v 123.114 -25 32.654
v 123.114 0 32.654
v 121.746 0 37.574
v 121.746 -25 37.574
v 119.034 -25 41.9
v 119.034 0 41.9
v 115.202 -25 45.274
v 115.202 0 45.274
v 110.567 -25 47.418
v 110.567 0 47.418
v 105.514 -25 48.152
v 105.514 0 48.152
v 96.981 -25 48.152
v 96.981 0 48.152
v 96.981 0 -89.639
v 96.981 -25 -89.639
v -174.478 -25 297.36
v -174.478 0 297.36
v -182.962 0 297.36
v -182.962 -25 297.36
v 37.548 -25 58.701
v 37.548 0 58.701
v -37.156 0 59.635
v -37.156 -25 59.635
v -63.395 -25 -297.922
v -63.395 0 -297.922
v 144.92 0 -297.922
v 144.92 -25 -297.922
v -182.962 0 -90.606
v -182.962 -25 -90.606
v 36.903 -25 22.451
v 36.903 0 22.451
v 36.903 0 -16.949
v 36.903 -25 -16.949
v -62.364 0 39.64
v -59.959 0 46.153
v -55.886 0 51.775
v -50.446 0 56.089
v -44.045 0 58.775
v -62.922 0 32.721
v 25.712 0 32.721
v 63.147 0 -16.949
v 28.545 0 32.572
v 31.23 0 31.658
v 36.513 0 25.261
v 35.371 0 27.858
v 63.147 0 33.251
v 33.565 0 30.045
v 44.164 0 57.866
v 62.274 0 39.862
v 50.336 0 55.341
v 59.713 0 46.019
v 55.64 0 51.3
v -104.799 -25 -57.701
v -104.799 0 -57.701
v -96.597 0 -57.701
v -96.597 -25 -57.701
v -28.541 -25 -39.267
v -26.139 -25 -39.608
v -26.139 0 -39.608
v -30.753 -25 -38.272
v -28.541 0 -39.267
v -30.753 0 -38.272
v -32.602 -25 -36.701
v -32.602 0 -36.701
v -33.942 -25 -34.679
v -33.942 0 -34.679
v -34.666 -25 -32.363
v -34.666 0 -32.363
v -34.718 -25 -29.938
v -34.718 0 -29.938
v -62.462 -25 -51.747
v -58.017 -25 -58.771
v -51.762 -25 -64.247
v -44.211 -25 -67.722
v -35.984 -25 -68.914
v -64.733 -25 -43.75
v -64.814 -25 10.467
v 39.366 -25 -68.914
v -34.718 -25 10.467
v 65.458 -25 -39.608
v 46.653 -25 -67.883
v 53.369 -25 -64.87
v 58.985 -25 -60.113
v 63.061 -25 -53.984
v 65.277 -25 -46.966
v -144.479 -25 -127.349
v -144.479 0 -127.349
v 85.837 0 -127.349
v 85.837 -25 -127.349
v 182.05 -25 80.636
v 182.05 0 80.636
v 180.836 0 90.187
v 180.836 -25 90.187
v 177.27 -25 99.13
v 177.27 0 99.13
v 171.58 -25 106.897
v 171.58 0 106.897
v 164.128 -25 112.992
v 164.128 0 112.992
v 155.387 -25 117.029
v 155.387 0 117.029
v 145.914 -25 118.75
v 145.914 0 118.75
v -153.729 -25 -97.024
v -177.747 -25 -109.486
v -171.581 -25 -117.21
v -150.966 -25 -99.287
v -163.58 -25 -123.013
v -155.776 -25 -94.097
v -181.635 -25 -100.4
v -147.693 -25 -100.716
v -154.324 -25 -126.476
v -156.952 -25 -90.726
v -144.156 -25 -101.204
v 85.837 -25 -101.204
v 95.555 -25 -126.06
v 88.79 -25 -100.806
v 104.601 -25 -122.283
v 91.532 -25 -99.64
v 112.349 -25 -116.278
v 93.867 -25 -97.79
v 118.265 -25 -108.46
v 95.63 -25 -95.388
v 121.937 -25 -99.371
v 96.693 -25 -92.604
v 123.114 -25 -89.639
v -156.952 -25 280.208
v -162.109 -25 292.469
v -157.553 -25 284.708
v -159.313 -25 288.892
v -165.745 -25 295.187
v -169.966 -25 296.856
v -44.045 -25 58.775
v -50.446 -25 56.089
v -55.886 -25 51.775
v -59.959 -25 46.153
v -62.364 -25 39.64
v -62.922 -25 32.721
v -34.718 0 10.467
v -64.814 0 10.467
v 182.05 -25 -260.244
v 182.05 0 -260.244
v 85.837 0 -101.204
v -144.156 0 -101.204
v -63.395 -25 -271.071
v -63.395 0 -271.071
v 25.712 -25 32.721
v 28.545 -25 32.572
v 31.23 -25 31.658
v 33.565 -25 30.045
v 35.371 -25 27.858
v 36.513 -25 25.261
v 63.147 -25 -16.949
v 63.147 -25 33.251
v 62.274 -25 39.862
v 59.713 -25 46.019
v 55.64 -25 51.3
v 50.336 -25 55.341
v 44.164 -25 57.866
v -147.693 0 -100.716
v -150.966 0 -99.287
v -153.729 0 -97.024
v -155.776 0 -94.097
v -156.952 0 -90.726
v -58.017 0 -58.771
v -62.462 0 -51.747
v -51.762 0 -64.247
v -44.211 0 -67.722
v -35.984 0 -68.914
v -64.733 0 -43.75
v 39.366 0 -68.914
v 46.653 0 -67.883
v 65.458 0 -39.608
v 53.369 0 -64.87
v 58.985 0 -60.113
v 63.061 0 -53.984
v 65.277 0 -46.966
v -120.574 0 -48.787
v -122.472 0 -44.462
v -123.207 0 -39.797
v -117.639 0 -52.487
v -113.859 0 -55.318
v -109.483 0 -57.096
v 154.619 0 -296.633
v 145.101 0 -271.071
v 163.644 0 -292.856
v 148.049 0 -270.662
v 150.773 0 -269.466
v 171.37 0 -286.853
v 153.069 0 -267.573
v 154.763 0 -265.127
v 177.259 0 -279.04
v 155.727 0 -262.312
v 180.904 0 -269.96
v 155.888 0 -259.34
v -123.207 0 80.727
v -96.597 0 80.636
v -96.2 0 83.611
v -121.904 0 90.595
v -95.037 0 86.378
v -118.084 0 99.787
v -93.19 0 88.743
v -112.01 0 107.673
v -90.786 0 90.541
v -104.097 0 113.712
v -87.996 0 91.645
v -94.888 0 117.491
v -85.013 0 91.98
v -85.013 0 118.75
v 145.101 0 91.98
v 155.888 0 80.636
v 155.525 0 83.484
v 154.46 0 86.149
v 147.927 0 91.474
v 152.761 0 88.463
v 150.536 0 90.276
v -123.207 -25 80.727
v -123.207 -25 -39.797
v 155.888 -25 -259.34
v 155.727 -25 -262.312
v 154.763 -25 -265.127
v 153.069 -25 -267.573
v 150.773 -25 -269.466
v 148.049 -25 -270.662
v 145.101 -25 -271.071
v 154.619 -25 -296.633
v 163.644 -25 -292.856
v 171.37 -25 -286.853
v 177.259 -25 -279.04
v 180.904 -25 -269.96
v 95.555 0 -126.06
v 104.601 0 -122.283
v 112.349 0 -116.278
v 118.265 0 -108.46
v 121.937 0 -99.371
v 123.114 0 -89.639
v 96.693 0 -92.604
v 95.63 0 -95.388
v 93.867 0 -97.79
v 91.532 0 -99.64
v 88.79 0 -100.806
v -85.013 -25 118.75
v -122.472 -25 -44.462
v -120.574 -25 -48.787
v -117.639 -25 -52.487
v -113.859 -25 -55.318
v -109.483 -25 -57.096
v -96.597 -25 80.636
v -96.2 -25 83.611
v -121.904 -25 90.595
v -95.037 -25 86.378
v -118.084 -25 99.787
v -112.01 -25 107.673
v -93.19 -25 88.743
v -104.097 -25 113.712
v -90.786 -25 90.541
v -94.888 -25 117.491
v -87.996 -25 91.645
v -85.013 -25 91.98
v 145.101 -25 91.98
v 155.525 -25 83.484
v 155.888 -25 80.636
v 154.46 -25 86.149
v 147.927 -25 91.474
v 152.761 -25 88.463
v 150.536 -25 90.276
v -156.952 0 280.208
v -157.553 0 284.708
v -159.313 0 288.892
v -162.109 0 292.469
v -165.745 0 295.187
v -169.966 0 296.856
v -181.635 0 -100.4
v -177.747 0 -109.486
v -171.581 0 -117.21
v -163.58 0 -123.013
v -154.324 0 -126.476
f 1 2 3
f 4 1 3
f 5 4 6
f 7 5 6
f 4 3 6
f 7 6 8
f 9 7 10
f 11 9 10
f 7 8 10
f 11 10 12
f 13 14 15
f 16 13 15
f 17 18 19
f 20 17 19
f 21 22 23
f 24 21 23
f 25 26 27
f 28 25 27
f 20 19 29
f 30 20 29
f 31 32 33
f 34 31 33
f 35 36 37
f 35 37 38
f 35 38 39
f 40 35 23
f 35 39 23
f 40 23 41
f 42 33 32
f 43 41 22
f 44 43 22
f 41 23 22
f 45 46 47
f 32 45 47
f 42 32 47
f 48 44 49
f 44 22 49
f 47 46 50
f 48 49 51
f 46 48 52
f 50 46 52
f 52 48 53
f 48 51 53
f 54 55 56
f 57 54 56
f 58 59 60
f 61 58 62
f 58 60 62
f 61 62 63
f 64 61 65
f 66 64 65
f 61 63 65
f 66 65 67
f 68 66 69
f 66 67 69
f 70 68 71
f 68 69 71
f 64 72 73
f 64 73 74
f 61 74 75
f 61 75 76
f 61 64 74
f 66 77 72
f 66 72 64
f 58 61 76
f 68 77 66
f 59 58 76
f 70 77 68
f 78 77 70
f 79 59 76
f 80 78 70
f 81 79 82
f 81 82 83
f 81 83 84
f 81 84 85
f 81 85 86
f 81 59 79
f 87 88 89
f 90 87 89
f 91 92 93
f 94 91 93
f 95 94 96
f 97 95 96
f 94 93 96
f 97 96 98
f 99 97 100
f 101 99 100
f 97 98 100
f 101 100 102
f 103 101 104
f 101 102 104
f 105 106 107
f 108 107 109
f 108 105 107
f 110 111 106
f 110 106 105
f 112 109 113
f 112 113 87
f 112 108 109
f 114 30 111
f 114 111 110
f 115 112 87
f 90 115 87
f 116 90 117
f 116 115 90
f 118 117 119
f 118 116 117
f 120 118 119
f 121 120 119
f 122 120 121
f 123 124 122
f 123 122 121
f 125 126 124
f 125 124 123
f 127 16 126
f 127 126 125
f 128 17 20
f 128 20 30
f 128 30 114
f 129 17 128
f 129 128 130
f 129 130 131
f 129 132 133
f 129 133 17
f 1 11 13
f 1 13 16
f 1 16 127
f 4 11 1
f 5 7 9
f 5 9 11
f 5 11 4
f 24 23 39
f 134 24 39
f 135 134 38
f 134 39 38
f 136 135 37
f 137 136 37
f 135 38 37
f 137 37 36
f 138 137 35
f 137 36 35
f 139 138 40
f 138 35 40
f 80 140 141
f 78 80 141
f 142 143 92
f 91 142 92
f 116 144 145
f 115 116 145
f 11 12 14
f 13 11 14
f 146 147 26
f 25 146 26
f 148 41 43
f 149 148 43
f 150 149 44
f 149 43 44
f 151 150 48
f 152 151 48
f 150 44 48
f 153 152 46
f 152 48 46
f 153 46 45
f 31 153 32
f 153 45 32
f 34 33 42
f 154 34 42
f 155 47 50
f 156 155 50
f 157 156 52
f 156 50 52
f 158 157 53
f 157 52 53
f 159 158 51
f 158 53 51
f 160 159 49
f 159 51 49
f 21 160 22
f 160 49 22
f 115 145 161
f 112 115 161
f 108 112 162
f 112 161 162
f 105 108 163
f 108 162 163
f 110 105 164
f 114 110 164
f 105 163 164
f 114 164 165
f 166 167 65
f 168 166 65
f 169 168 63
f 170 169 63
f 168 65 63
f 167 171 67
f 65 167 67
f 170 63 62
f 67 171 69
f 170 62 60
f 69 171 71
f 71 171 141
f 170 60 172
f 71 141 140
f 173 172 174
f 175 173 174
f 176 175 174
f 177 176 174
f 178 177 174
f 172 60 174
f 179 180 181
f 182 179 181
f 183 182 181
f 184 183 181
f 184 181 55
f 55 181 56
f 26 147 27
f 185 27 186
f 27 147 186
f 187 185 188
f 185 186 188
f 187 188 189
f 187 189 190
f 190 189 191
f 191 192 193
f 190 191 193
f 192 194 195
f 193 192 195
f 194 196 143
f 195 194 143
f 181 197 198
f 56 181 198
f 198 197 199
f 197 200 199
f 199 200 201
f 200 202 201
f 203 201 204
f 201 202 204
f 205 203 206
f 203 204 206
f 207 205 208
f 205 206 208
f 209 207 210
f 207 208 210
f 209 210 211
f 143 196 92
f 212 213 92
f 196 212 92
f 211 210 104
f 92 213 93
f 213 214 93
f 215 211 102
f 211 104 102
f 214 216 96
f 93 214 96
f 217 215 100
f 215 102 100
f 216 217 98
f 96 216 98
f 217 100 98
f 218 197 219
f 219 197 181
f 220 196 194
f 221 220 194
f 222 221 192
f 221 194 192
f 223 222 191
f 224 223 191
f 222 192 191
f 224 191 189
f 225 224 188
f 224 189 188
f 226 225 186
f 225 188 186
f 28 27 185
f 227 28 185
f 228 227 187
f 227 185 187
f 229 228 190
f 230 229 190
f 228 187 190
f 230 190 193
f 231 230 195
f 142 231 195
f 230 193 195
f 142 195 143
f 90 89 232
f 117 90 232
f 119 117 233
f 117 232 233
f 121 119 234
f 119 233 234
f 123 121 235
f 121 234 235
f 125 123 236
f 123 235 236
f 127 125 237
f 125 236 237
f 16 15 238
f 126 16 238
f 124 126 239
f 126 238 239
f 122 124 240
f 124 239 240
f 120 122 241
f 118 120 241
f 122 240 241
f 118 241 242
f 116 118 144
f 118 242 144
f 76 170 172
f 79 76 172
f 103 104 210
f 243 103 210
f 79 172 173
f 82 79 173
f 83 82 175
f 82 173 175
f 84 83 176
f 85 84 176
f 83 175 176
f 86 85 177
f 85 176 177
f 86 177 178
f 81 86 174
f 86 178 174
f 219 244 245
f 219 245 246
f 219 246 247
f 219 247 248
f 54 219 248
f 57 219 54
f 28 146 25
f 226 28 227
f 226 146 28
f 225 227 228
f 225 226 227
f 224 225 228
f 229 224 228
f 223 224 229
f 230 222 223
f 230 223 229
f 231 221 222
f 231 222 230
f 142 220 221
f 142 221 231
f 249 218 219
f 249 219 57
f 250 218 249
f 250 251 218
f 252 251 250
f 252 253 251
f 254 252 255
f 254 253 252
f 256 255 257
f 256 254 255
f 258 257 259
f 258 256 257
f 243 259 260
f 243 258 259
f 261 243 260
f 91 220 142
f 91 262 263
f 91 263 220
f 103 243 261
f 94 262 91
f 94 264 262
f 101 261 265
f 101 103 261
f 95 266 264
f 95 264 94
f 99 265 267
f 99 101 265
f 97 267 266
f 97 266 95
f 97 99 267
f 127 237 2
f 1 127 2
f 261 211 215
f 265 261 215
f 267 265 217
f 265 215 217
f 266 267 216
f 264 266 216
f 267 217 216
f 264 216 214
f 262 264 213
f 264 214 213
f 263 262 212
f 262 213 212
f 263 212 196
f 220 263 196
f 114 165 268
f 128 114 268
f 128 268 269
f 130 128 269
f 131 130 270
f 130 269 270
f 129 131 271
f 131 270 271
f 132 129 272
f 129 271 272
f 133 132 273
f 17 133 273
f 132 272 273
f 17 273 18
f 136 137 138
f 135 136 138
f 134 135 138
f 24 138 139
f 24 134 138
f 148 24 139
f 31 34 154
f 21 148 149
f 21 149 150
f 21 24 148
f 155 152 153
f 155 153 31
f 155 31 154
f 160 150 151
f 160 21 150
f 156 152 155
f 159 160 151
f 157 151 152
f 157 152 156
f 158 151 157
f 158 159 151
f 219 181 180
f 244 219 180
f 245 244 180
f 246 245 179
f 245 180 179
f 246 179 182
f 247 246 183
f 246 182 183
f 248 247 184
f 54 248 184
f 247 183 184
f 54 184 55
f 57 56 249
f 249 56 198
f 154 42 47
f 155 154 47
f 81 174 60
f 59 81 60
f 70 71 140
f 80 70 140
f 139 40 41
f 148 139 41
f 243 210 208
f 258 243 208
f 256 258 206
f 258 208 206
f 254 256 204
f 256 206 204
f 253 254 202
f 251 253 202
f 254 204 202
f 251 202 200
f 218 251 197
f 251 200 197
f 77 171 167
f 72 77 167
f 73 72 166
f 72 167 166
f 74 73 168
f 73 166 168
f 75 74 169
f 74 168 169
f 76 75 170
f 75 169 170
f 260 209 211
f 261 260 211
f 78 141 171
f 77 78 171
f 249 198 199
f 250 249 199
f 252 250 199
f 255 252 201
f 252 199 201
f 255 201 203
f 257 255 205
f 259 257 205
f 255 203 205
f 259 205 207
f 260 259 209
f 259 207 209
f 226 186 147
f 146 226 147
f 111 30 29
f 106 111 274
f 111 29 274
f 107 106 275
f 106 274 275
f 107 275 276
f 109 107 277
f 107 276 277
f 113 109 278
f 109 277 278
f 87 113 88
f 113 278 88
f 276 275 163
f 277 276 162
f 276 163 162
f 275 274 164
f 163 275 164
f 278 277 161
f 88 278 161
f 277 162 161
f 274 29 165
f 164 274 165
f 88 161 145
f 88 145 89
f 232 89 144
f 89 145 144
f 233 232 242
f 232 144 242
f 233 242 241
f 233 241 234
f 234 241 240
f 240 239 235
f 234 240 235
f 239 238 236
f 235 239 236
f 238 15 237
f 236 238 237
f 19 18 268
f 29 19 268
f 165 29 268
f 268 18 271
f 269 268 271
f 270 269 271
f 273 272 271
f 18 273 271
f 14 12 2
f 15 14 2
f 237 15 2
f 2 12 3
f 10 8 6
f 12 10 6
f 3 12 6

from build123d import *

# Parameters (mm, degrees)
F1_DEPTH = 25
F3_DEPTH = 25
F5_DEPTH = 25
F7_DEPTH = 25


with BuildPart() as f1:
    # F0 (on Front) → F1 (new body)
    with BuildSketch(Plane.XZ):
        with BuildLine():
            Line((-174.477761, 297.359556), (-182.962418, 297.359556))
            Line((-182.962418, 297.359556), (-182.962418, -90.606354))
            ThreePointArc((-182.962418, -90.606354), (-171.580706, -117.209903), (-144.479349, -127.349362))
            Line((-144.479349, -127.349362), (85.836962, -127.349362))
            ThreePointArc((85.836962, -127.349362), (112.349477, -116.277602), (123.113878, -89.638814))
            Line((123.113878, -89.638814), (123.113878, 32.654025))
            ThreePointArc((123.113878, 32.654025), (117.239595, 43.725564), (105.514027, 48.152443))
            Line((105.514027, 48.152443), (96.981473, 48.152443))
            Line((96.981473, 48.152443), (96.981473, -89.638814))
            ThreePointArc((96.981473, -89.638814), (93.867483, -97.7903), (85.836962, -101.204149))
            Line((85.836962, -101.204149), (-144.15586, -101.204149))
            ThreePointArc((-144.15586, -101.204149), (-152.425528, -98.25033), (-156.952441, -90.725735))
            Line((-156.952441, -90.725735), (-156.952441, 280.20823))
            ThreePointArc((-156.952441, 280.20823), (-162.108646, 292.468989), (-174.477761, 297.359556))
        make_face()
    extrude(amount=F1_DEPTH)


with BuildPart() as f3:
    # F2 (on Front) → F3 (new body)
    with BuildSketch(Plane.XZ):
        with BuildLine():
            Line((-34.718242, 10.46715), (-64.814202, 10.46715))
            Line((-64.814202, 10.46715), (-64.732675, -43.750239))
            ThreePointArc((-64.732675, -43.750239), (-55.086715, -61.734274), (-35.983678, -68.913691))
            Line((-35.983678, -68.913691), (39.365645, -68.913691))
            ThreePointArc((39.365645, -68.913691), (58.984989, -60.112924), (65.458328, -39.607607))
            Line((65.458328, -39.607607), (-26.138535, -39.607607))
            ThreePointArc((-26.138535, -39.607607), (-32.602285, -36.701397), (-34.718242, -29.937608))
            Line((-34.718242, -29.937608), (-34.718242, 10.46715))
        make_face()
    extrude(amount=F3_DEPTH)


with BuildPart() as f5:
    # F4 (on Front) → F5 (new body)
    with BuildSketch(Plane.XZ):
        with BuildLine():
            ThreePointArc((-37.156084, 59.634864), (-55.885526, 51.774768), (-62.92218, 32.72067))
            Line((-62.92218, 32.72067), (25.711916, 32.72067))
            ThreePointArc((25.711916, 32.72067), (33.56457, 30.045299), (36.902893, 22.450738))
            Line((36.902893, 22.450738), (36.902893, -16.94929))
            Line((36.902893, -16.94929), (63.147232, -16.94929))
            Line((63.147232, -16.94929), (63.147232, 33.251408))
            ThreePointArc((63.147232, 33.251408), (55.640323, 51.299866), (37.54819, 58.700895))
            Line((37.54819, 58.700895), (-37.156084, 59.634864))
        make_face()
    extrude(amount=F5_DEPTH)


with BuildPart() as f7:
    # F6 (on Front) → F7 (new body)
    with BuildSketch(Plane.XZ):
        with BuildLine():
            Line((-104.799263, -57.701193), (-96.597366, -57.701193))
            Line((-96.597366, -57.701193), (-96.597366, 80.636278))
            ThreePointArc((-96.597366, 80.636278), (-93.18955, 88.742844), (-85.013218, 91.979697))
            Line((-85.013218, 91.979697), (145.101115, 91.979697))
            ThreePointArc((145.101115, 91.979697), (152.760643, 88.462939), (155.887835, 80.636278))
            Line((155.887835, 80.636278), (155.887835, -259.340197))
            ThreePointArc((155.887835, -259.340197), (153.069352, -267.573366), (145.101085, -271.071315))
            Line((145.101085, -271.071315), (-63.395165, -271.071315))
            Line((-63.395165, -271.071315), (-63.395165, -297.922254))
            Line((-63.395165, -297.922254), (144.920394, -297.922254))
            ThreePointArc((144.920394, -297.922254), (171.369959, -286.852716), (182.050481, -260.243684))
            Line((182.050481, -260.243684), (182.050481, 80.636278))
            ThreePointArc((182.050481, 80.636278), (171.580327, 106.896784), (145.914242, 118.749648))
            Line((145.914242, 118.749648), (-85.013218, 118.749648))
            ThreePointArc((-85.013218, 118.749648), (-112.009716, 107.673307), (-123.20672, 80.726631))
            Line((-123.20672, 80.726631), (-123.20672, -39.796535))
            ThreePointArc((-123.20672, -39.796535), (-117.638765, -52.486737), (-104.799263, -57.701193))
        make_face()
    extrude(amount=F7_DEPTH)


solid = Compound([f1.part, f3.part, f5.part, f7.part])
